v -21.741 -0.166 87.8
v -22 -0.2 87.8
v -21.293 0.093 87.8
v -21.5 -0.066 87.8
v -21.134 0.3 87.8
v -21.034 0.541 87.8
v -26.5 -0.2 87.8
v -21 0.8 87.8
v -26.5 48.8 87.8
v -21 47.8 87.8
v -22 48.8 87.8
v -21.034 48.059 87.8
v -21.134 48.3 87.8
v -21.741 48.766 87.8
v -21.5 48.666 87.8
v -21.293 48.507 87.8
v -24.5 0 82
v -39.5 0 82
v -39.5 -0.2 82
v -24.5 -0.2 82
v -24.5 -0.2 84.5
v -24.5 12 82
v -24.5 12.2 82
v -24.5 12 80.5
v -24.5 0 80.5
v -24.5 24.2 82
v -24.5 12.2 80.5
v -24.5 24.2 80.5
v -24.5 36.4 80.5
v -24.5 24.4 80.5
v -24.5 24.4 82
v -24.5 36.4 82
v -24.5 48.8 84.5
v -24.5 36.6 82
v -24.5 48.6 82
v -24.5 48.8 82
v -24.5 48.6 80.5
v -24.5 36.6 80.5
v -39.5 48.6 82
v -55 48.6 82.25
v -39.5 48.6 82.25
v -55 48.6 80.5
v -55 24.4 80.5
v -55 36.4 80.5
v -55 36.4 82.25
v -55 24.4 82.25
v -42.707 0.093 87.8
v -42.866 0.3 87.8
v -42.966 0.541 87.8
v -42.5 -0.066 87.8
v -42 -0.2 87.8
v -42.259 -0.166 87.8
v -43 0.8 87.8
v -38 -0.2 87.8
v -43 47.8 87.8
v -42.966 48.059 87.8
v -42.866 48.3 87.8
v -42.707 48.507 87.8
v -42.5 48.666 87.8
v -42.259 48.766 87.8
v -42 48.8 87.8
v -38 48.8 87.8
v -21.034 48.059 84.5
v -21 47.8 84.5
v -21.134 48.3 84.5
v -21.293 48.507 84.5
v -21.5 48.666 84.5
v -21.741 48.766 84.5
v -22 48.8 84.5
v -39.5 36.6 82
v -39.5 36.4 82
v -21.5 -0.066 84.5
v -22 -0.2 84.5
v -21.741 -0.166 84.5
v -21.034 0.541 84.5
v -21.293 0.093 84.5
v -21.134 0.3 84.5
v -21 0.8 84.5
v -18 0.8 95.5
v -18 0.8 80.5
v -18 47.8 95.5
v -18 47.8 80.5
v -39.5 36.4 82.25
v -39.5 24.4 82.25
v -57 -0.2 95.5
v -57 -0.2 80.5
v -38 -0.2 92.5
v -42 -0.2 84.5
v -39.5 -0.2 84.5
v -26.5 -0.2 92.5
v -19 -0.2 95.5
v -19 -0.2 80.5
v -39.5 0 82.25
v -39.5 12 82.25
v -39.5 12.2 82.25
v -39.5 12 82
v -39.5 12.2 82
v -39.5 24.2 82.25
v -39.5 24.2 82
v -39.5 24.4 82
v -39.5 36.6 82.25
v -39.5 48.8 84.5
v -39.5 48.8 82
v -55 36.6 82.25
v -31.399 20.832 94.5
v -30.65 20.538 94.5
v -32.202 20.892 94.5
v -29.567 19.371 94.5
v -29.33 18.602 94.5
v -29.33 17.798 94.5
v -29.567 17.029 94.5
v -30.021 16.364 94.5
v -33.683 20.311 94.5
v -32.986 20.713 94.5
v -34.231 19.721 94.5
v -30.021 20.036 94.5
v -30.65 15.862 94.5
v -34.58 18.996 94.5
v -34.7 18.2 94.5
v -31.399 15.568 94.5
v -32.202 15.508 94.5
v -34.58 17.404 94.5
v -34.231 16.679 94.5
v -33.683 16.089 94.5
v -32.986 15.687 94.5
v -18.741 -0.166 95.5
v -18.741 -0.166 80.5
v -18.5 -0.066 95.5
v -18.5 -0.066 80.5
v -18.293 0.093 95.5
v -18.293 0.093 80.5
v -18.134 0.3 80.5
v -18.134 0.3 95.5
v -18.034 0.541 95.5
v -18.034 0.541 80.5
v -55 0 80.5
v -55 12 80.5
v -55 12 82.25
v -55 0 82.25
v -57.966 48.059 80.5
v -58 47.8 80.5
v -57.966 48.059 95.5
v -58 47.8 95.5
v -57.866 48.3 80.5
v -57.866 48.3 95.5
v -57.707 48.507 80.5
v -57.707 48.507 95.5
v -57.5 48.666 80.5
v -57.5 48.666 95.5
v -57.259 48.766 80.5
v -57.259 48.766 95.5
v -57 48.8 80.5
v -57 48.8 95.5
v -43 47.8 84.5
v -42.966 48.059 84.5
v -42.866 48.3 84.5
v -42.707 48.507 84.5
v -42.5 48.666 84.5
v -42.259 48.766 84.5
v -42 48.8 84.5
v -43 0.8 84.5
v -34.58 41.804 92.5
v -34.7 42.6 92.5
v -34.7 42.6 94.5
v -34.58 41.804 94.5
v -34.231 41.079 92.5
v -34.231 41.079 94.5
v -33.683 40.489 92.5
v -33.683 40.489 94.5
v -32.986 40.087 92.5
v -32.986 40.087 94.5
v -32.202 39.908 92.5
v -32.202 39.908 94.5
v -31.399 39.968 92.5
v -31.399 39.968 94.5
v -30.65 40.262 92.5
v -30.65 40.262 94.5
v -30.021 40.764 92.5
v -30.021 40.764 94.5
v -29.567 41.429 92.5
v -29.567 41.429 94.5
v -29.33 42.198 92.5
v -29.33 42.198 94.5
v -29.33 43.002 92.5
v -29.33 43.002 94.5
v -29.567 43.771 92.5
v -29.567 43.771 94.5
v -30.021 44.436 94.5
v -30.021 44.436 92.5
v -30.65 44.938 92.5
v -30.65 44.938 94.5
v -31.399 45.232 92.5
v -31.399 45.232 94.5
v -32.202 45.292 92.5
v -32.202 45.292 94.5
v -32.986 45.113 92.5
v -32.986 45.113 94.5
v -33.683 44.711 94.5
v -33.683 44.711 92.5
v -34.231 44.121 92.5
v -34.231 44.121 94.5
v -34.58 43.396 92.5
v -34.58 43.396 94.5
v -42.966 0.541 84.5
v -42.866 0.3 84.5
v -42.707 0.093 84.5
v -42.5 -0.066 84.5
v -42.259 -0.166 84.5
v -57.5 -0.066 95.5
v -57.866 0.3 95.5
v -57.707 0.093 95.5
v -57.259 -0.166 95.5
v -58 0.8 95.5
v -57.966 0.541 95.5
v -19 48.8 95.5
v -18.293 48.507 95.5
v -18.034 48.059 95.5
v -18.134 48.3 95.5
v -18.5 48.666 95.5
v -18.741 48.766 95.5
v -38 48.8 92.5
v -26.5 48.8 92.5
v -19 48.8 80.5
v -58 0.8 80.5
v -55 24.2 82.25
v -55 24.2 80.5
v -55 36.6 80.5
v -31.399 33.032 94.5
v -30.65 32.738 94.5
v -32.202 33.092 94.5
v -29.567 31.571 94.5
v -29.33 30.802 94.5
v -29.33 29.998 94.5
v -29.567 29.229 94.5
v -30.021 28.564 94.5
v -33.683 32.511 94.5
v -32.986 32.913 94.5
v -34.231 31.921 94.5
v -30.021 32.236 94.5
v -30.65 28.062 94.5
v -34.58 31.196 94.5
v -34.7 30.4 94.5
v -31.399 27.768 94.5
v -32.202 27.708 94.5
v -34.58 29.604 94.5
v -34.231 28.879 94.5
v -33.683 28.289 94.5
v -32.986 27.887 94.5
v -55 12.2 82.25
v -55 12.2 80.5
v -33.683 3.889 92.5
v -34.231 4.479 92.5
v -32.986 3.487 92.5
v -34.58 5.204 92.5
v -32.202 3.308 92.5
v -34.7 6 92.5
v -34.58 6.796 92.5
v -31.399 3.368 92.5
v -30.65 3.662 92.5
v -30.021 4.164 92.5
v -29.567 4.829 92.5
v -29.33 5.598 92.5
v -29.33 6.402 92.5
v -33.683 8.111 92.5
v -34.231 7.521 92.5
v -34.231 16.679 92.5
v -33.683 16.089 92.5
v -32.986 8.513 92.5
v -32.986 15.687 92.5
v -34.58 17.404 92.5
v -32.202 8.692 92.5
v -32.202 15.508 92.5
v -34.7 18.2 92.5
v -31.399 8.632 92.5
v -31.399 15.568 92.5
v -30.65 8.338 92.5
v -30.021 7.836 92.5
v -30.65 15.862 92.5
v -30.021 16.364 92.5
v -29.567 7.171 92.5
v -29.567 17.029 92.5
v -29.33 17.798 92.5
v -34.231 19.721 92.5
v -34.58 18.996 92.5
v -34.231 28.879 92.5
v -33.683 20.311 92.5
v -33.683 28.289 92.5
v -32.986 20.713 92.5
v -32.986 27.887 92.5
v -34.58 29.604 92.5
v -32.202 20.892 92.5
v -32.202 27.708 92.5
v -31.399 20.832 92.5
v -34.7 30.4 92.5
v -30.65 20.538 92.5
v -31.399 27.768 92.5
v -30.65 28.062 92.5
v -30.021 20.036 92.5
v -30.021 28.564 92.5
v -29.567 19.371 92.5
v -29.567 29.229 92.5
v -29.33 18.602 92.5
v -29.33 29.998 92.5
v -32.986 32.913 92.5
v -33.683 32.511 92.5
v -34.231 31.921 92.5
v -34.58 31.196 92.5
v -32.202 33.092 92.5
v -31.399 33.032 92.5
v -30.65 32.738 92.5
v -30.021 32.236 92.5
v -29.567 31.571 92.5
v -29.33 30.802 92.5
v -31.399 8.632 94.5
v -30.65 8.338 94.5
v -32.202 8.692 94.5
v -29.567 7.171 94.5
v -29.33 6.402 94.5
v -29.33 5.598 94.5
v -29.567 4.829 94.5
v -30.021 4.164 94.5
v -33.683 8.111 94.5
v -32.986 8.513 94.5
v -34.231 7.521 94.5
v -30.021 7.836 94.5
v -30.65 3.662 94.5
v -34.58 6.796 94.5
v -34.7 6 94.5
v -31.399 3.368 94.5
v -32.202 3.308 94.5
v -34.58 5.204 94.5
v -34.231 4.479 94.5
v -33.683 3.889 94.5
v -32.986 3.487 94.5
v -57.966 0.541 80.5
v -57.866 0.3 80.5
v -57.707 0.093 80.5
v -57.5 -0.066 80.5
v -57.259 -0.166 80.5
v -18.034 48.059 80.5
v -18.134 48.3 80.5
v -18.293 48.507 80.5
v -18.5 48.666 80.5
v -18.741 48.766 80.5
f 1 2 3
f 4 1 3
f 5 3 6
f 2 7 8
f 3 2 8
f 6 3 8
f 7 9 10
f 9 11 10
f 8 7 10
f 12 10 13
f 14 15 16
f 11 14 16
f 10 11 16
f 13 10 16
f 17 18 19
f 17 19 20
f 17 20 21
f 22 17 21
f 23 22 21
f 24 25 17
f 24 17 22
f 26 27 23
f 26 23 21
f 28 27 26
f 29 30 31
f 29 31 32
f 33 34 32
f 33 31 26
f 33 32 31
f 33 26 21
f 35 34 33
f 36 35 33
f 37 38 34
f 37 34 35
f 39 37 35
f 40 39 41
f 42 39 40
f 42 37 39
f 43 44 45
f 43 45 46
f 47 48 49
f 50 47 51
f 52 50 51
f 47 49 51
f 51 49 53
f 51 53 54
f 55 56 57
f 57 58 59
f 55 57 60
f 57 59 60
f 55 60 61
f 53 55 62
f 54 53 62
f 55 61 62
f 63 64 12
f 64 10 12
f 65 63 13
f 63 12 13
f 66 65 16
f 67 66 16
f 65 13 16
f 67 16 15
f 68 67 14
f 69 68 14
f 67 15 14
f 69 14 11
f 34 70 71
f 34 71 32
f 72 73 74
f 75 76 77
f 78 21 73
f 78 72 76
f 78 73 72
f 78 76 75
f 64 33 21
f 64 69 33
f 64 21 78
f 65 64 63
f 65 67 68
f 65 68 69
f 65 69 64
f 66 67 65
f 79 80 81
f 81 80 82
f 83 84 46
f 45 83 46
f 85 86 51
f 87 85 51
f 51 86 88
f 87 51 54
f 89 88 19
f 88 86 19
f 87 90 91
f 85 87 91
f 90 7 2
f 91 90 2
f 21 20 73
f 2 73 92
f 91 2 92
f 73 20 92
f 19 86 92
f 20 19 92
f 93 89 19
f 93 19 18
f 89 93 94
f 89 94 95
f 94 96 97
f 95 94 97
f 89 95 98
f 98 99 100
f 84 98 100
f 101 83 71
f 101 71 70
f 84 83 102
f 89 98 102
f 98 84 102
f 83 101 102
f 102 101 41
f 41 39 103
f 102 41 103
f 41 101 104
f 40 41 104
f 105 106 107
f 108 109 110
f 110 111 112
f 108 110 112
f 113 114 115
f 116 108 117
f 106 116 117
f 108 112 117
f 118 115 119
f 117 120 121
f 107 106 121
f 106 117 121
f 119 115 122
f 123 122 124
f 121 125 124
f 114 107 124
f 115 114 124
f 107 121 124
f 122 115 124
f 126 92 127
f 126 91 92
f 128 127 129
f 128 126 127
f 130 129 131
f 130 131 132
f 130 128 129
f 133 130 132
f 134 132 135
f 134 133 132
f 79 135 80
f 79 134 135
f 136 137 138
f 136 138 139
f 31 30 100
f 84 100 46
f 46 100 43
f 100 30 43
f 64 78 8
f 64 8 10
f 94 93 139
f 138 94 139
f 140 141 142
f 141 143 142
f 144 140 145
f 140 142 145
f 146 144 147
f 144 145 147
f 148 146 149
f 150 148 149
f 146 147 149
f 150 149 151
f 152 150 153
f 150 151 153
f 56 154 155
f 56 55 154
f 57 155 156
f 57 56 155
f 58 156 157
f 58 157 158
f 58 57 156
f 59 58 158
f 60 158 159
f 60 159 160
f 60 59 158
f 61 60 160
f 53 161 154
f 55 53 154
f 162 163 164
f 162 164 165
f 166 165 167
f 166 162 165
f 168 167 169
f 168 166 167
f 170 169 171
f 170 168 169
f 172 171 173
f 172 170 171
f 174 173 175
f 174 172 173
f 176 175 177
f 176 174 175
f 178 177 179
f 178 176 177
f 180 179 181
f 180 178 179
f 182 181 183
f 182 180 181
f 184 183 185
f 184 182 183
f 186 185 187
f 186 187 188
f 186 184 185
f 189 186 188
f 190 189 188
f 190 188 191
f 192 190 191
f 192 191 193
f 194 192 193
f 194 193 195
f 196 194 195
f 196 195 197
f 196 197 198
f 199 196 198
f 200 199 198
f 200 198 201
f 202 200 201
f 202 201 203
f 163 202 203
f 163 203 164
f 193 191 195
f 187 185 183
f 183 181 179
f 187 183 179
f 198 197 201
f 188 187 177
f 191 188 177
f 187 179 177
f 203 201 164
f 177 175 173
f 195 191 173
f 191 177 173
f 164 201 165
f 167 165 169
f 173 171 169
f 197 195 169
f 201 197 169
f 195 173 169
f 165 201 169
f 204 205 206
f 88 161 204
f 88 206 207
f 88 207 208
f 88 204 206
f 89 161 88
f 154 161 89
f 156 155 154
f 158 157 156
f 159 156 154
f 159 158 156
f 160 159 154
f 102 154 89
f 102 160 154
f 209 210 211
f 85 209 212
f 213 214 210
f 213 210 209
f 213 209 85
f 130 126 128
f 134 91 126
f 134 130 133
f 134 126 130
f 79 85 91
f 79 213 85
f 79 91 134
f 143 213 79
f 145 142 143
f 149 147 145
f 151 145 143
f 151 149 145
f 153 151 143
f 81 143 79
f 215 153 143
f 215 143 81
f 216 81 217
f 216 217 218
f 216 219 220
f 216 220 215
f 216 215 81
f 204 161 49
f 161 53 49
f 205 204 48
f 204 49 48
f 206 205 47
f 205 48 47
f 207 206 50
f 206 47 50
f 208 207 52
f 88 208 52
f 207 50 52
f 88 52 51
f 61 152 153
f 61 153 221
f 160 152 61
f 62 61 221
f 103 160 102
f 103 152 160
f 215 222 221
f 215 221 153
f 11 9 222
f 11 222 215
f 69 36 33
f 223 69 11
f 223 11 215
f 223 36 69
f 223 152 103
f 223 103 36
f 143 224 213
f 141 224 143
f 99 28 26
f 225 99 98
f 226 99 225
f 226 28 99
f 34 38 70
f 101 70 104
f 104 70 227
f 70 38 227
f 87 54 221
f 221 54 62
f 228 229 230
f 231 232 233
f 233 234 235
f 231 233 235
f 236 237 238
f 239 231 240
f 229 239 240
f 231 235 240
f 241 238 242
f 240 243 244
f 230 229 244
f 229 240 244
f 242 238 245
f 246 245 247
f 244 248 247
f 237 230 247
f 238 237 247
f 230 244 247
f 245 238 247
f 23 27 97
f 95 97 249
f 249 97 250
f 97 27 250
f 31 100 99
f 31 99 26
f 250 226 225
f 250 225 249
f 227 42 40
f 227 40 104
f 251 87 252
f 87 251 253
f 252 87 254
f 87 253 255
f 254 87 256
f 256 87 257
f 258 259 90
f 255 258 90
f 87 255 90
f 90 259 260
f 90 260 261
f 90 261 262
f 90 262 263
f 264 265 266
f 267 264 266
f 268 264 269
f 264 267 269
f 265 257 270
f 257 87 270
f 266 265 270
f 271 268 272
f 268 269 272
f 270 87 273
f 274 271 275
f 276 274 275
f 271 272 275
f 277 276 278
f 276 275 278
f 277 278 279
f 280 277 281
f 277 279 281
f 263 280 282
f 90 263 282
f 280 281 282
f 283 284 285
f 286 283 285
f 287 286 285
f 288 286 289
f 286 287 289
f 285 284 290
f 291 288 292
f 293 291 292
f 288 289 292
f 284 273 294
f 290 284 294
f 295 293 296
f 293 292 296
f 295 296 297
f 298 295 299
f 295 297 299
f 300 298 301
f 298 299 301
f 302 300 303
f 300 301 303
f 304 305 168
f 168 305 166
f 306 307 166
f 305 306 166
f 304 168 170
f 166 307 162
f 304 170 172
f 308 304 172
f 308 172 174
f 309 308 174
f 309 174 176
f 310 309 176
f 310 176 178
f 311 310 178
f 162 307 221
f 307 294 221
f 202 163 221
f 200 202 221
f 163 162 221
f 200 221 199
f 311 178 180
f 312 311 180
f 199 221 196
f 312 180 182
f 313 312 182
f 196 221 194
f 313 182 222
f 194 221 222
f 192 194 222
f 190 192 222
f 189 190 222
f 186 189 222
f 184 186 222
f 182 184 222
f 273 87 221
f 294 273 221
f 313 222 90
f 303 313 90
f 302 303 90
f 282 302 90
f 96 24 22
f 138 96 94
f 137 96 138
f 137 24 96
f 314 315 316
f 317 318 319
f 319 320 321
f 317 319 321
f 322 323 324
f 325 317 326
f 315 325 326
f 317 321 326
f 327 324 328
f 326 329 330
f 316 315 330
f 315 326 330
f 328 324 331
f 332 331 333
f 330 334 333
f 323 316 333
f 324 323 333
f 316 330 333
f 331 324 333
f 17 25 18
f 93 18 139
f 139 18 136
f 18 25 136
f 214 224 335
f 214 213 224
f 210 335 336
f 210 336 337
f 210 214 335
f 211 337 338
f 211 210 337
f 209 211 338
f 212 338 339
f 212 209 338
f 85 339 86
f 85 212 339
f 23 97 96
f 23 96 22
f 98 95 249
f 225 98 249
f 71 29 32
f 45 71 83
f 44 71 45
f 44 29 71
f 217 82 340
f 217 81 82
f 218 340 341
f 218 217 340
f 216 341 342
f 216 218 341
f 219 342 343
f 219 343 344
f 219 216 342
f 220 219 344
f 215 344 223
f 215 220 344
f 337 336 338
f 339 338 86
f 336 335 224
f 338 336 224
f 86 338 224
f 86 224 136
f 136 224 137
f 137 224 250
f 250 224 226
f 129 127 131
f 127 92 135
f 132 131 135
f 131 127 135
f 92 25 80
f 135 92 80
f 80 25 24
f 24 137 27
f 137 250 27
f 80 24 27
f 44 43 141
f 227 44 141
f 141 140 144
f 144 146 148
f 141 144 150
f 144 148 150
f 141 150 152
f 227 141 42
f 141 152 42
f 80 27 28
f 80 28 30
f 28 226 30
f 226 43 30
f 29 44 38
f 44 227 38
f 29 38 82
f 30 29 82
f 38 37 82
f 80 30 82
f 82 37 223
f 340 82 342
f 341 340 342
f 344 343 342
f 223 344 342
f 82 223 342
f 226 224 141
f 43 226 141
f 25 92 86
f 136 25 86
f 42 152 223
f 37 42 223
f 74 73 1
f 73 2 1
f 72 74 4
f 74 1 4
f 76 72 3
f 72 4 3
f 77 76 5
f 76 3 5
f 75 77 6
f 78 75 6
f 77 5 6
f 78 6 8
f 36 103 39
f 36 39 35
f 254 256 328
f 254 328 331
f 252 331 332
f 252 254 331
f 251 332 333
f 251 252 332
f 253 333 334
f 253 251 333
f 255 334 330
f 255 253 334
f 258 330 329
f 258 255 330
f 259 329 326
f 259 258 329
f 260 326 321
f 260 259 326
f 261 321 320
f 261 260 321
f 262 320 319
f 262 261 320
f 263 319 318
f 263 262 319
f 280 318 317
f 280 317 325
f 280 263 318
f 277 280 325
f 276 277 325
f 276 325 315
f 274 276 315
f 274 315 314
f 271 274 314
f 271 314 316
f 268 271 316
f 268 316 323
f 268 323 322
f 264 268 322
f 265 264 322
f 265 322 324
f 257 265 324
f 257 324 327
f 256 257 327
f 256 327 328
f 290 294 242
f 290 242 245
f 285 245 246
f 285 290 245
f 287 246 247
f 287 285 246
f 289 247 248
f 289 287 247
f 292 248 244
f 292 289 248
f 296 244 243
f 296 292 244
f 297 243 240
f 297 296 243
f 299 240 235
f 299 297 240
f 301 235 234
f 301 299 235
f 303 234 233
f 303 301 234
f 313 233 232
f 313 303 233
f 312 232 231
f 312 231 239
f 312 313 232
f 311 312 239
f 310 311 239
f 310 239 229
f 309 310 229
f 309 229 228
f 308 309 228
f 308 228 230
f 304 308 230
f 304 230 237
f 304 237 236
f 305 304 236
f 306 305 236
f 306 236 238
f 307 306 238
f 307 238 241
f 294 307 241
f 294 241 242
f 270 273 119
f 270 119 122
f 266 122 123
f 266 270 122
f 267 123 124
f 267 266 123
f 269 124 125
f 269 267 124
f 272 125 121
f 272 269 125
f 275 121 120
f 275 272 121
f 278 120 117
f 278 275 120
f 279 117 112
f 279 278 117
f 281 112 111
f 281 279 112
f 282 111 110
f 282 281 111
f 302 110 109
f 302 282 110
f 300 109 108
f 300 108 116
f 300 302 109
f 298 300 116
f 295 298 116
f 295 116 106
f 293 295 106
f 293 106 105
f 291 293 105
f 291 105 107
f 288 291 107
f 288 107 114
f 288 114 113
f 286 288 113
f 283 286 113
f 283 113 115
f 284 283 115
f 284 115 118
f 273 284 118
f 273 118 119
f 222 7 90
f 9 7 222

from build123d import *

# Parameters (mm, degrees)
BOX004_W                  = 11.5
BOX004_H                  = 49
BOX004_DEPTH              = 8
BOX003_W                  = 22
BOX003_H                  = 49
BOX003_DEPTH              = 3.3
FILLET001_R               = 1
BOX005_W                  = 15
BOX005_H                  = 49
BOX005_DEPTH              = 3
BOX001_W                  = 30.5
BOX001_H                  = 12
BOX001_DEPTH              = 2.25
CYLINDER_R                = 2.7
CYLINDER_DEPTH            = 10
BOX002_W                  = 15
BOX002_H                  = 12
BOX002_DEPTH              = 2.25
FILLET_R                  = 2
FUSION001_PLACEMENT_ANGLE = 180
CYLINDER001_R             = 2.7
CYLINDER001_DEPTH         = 10
BOX_W                     = 120
BOX_H                     = 12
BOX_DEPTH                 = 80
FILLET002_R               = 0.5
ARRAY_Y_COUNT             = 4
ARRAY_Y_PITCH             = 12.2
BOX006_W                  = 40
BOX006_H                  = 49
BOX006_DEPTH              = 15
FILLET003_R               = 1


with BuildPart() as box004:
    # Box004 → Box004 (new body)
    with BuildSketch(Plane(origin=(-38, -0.2, 84.5), x_dir=(1, 0, 0), z_dir=(0, 0, 1))):
        with Locations((5.75, 24.5)):
            Rectangle(BOX004_W, BOX004_H)
    extrude(amount=BOX004_DEPTH)


with BuildPart() as fillet001:
    # Box003 → Box003 (new body)
    with BuildSketch(Plane(origin=(-43, -0.2, 84.5), x_dir=(1, 0, 0), z_dir=(0, 0, 1))):
        with Locations((11, 24.5)):
            Rectangle(BOX003_W, BOX003_H)
    extrude(amount=BOX003_DEPTH)

    # Fillet001
    fillet001_edges = [fillet001.edges().sort_by_distance(p)[0] for p in [
        (-43, -0.2, 86.15),
        (-43, 48.8, 86.15),
        (-21, -0.2, 86.15),
        (-21, 48.8, 86.15),
    ]]
    fillet(fillet001_edges, radius=FILLET001_R)


with BuildPart() as fusion002005:
    # Box005 → Box005 (new body)
    with BuildSketch(Plane(origin=(-39.5, -0.2, 82), x_dir=(1, 0, 0), z_dir=(0, 0, 1))):
        with Locations((7.5, 24.5)):
            Rectangle(BOX005_W, BOX005_H)
    extrude(amount=BOX005_DEPTH)

    # Fusion002005: union Box004, Fillet001
    add(box004.part)
    add(fillet001.part)


with BuildPart() as dianpian:
    # Box001 → Box001 (new body)
    with BuildSketch(Plane.XY):
        with Locations((15.25, 6)):
            Rectangle(BOX001_W, BOX001_H)
    extrude(amount=BOX001_DEPTH)


with BuildPart() as cylinder:
    # Cylinder → Cylinder (new body)
    with BuildSketch(Plane(origin=(7.5, 6, 4.5), x_dir=(1, 0, 0), z_dir=(0, 0, 1))):
        Circle(CYLINDER_R)
    extrude(amount=CYLINDER_DEPTH)


with BuildPart() as fillet_body:
    # Box002 → Box002 (new body)
    with BuildSketch(Plane.XY.offset(2.25)):
        with Locations((7.5, 6)):
            Rectangle(BOX002_W, BOX002_H)
    extrude(amount=BOX002_DEPTH)

    # Fillet
    fillet_edges = [fillet_body.edges().sort_by_distance(p)[0] for p in [
        (0, 6, 4.5),
        (15, 6, 4.5),
    ]]
    fillet(fillet_edges, radius=FILLET_R)


with BuildPart() as fusion001:
    # Fusion001 base: copy of Fillet body
    add(fillet_body.part)

    # Fusion001: union dianpian, Cylinder
    add(dianpian.part)
    add(cylinder.part)


with BuildPart() as fusion001_1:
    # Fusion001 placement: moved
    add(fusion001.part.moved(Location((-24.5, 12, 80))).rotate(Axis((-24.5, 12, 80), (0, 0, 1)), FUSION001_PLACEMENT_ANGLE))


with BuildPart() as cylinder001:
    # Cylinder001 → Cylinder001 (new body)
    with BuildSketch(Plane(origin=(7.5, 6, 4.5), x_dir=(1, 0, 0), z_dir=(0, 0, 1))):
        Circle(CYLINDER001_R)
    extrude(amount=CYLINDER001_DEPTH)


with BuildPart() as fillet002:
    # Box → Box (new body)
    with BuildSketch(Plane(origin=(-84.5, 0, -80), x_dir=(1, 0, 0), z_dir=(0, 0, 1))):
        with Locations((60, 6)):
            Rectangle(BOX_W, BOX_H)
    extrude(amount=BOX_DEPTH)

    # Fillet002
    fillet002_edges = [fillet002.edges().sort_by_distance(p)[0] for p in [
        (-84.5, 0, -40),
        (-84.5, 6, 0),
        (-84.5, 12, -40),
        (-84.5, 6, -80),
        (35.5, 0, -40),
        (35.5, 6, 0),
        (35.5, 12, -40),
        (35.5, 6, -80),
        (-24.5, 0, -80),
        (-24.5, 0, 0),
        (-24.5, 12, -80),
        (-24.5, 12, 0),
    ]]
    fillet(fillet002_edges, radius=FILLET002_R)


with BuildPart() as fusion002006:
    # Fusion base: copy of Fillet body
    add(fillet_body.part)

    # Fusion: union dianpian, Cylinder, Fillet002
    add(dianpian.part)
    add(cylinder.part)
    add(fillet002.part)


with BuildPart() as fusion002006_1:
    # Fusion placement: moved
    add(fusion002006.part.moved(Location((24.5, 0, 80))))

    # Fusion002: union Fusion001, Cylinder001
    add(fusion001_1.part)
    add(cylinder001.part)

    # Array Y: Fusion002006 ×4


with BuildPart() as fusion002006_2:
    add(fusion002006_1.part)
    with Locations(*[(0, i * ARRAY_Y_PITCH, 0) for i in range(1, ARRAY_Y_COUNT)]):
        add(fusion002006_1.part)

    # Fusion002006: union Fusion002005
    add(fusion002005.part)


with BuildPart() as cut:
    # Box006 → Box006 (new body)
    with BuildSketch(Plane(origin=(-58, -0.2, 80.5), x_dir=(1, 0, 0), z_dir=(0, 0, 1))):
        with Locations((20, 24.5)):
            Rectangle(BOX006_W, BOX006_H)
    extrude(amount=BOX006_DEPTH)

    # Fillet003
    fillet003_edges = [cut.edges().sort_by_distance(p)[0] for p in [
        (-58, -0.2, 88),
        (-58, 48.8, 88),
        (-18, -0.2, 88),
        (-18, 48.8, 88),
    ]]
    fillet(fillet003_edges, radius=FILLET003_R)

    # Cut: cut Fusion002006
    add(fusion002006_2.part, mode=Mode.SUBTRACT)


solid = cut.part
